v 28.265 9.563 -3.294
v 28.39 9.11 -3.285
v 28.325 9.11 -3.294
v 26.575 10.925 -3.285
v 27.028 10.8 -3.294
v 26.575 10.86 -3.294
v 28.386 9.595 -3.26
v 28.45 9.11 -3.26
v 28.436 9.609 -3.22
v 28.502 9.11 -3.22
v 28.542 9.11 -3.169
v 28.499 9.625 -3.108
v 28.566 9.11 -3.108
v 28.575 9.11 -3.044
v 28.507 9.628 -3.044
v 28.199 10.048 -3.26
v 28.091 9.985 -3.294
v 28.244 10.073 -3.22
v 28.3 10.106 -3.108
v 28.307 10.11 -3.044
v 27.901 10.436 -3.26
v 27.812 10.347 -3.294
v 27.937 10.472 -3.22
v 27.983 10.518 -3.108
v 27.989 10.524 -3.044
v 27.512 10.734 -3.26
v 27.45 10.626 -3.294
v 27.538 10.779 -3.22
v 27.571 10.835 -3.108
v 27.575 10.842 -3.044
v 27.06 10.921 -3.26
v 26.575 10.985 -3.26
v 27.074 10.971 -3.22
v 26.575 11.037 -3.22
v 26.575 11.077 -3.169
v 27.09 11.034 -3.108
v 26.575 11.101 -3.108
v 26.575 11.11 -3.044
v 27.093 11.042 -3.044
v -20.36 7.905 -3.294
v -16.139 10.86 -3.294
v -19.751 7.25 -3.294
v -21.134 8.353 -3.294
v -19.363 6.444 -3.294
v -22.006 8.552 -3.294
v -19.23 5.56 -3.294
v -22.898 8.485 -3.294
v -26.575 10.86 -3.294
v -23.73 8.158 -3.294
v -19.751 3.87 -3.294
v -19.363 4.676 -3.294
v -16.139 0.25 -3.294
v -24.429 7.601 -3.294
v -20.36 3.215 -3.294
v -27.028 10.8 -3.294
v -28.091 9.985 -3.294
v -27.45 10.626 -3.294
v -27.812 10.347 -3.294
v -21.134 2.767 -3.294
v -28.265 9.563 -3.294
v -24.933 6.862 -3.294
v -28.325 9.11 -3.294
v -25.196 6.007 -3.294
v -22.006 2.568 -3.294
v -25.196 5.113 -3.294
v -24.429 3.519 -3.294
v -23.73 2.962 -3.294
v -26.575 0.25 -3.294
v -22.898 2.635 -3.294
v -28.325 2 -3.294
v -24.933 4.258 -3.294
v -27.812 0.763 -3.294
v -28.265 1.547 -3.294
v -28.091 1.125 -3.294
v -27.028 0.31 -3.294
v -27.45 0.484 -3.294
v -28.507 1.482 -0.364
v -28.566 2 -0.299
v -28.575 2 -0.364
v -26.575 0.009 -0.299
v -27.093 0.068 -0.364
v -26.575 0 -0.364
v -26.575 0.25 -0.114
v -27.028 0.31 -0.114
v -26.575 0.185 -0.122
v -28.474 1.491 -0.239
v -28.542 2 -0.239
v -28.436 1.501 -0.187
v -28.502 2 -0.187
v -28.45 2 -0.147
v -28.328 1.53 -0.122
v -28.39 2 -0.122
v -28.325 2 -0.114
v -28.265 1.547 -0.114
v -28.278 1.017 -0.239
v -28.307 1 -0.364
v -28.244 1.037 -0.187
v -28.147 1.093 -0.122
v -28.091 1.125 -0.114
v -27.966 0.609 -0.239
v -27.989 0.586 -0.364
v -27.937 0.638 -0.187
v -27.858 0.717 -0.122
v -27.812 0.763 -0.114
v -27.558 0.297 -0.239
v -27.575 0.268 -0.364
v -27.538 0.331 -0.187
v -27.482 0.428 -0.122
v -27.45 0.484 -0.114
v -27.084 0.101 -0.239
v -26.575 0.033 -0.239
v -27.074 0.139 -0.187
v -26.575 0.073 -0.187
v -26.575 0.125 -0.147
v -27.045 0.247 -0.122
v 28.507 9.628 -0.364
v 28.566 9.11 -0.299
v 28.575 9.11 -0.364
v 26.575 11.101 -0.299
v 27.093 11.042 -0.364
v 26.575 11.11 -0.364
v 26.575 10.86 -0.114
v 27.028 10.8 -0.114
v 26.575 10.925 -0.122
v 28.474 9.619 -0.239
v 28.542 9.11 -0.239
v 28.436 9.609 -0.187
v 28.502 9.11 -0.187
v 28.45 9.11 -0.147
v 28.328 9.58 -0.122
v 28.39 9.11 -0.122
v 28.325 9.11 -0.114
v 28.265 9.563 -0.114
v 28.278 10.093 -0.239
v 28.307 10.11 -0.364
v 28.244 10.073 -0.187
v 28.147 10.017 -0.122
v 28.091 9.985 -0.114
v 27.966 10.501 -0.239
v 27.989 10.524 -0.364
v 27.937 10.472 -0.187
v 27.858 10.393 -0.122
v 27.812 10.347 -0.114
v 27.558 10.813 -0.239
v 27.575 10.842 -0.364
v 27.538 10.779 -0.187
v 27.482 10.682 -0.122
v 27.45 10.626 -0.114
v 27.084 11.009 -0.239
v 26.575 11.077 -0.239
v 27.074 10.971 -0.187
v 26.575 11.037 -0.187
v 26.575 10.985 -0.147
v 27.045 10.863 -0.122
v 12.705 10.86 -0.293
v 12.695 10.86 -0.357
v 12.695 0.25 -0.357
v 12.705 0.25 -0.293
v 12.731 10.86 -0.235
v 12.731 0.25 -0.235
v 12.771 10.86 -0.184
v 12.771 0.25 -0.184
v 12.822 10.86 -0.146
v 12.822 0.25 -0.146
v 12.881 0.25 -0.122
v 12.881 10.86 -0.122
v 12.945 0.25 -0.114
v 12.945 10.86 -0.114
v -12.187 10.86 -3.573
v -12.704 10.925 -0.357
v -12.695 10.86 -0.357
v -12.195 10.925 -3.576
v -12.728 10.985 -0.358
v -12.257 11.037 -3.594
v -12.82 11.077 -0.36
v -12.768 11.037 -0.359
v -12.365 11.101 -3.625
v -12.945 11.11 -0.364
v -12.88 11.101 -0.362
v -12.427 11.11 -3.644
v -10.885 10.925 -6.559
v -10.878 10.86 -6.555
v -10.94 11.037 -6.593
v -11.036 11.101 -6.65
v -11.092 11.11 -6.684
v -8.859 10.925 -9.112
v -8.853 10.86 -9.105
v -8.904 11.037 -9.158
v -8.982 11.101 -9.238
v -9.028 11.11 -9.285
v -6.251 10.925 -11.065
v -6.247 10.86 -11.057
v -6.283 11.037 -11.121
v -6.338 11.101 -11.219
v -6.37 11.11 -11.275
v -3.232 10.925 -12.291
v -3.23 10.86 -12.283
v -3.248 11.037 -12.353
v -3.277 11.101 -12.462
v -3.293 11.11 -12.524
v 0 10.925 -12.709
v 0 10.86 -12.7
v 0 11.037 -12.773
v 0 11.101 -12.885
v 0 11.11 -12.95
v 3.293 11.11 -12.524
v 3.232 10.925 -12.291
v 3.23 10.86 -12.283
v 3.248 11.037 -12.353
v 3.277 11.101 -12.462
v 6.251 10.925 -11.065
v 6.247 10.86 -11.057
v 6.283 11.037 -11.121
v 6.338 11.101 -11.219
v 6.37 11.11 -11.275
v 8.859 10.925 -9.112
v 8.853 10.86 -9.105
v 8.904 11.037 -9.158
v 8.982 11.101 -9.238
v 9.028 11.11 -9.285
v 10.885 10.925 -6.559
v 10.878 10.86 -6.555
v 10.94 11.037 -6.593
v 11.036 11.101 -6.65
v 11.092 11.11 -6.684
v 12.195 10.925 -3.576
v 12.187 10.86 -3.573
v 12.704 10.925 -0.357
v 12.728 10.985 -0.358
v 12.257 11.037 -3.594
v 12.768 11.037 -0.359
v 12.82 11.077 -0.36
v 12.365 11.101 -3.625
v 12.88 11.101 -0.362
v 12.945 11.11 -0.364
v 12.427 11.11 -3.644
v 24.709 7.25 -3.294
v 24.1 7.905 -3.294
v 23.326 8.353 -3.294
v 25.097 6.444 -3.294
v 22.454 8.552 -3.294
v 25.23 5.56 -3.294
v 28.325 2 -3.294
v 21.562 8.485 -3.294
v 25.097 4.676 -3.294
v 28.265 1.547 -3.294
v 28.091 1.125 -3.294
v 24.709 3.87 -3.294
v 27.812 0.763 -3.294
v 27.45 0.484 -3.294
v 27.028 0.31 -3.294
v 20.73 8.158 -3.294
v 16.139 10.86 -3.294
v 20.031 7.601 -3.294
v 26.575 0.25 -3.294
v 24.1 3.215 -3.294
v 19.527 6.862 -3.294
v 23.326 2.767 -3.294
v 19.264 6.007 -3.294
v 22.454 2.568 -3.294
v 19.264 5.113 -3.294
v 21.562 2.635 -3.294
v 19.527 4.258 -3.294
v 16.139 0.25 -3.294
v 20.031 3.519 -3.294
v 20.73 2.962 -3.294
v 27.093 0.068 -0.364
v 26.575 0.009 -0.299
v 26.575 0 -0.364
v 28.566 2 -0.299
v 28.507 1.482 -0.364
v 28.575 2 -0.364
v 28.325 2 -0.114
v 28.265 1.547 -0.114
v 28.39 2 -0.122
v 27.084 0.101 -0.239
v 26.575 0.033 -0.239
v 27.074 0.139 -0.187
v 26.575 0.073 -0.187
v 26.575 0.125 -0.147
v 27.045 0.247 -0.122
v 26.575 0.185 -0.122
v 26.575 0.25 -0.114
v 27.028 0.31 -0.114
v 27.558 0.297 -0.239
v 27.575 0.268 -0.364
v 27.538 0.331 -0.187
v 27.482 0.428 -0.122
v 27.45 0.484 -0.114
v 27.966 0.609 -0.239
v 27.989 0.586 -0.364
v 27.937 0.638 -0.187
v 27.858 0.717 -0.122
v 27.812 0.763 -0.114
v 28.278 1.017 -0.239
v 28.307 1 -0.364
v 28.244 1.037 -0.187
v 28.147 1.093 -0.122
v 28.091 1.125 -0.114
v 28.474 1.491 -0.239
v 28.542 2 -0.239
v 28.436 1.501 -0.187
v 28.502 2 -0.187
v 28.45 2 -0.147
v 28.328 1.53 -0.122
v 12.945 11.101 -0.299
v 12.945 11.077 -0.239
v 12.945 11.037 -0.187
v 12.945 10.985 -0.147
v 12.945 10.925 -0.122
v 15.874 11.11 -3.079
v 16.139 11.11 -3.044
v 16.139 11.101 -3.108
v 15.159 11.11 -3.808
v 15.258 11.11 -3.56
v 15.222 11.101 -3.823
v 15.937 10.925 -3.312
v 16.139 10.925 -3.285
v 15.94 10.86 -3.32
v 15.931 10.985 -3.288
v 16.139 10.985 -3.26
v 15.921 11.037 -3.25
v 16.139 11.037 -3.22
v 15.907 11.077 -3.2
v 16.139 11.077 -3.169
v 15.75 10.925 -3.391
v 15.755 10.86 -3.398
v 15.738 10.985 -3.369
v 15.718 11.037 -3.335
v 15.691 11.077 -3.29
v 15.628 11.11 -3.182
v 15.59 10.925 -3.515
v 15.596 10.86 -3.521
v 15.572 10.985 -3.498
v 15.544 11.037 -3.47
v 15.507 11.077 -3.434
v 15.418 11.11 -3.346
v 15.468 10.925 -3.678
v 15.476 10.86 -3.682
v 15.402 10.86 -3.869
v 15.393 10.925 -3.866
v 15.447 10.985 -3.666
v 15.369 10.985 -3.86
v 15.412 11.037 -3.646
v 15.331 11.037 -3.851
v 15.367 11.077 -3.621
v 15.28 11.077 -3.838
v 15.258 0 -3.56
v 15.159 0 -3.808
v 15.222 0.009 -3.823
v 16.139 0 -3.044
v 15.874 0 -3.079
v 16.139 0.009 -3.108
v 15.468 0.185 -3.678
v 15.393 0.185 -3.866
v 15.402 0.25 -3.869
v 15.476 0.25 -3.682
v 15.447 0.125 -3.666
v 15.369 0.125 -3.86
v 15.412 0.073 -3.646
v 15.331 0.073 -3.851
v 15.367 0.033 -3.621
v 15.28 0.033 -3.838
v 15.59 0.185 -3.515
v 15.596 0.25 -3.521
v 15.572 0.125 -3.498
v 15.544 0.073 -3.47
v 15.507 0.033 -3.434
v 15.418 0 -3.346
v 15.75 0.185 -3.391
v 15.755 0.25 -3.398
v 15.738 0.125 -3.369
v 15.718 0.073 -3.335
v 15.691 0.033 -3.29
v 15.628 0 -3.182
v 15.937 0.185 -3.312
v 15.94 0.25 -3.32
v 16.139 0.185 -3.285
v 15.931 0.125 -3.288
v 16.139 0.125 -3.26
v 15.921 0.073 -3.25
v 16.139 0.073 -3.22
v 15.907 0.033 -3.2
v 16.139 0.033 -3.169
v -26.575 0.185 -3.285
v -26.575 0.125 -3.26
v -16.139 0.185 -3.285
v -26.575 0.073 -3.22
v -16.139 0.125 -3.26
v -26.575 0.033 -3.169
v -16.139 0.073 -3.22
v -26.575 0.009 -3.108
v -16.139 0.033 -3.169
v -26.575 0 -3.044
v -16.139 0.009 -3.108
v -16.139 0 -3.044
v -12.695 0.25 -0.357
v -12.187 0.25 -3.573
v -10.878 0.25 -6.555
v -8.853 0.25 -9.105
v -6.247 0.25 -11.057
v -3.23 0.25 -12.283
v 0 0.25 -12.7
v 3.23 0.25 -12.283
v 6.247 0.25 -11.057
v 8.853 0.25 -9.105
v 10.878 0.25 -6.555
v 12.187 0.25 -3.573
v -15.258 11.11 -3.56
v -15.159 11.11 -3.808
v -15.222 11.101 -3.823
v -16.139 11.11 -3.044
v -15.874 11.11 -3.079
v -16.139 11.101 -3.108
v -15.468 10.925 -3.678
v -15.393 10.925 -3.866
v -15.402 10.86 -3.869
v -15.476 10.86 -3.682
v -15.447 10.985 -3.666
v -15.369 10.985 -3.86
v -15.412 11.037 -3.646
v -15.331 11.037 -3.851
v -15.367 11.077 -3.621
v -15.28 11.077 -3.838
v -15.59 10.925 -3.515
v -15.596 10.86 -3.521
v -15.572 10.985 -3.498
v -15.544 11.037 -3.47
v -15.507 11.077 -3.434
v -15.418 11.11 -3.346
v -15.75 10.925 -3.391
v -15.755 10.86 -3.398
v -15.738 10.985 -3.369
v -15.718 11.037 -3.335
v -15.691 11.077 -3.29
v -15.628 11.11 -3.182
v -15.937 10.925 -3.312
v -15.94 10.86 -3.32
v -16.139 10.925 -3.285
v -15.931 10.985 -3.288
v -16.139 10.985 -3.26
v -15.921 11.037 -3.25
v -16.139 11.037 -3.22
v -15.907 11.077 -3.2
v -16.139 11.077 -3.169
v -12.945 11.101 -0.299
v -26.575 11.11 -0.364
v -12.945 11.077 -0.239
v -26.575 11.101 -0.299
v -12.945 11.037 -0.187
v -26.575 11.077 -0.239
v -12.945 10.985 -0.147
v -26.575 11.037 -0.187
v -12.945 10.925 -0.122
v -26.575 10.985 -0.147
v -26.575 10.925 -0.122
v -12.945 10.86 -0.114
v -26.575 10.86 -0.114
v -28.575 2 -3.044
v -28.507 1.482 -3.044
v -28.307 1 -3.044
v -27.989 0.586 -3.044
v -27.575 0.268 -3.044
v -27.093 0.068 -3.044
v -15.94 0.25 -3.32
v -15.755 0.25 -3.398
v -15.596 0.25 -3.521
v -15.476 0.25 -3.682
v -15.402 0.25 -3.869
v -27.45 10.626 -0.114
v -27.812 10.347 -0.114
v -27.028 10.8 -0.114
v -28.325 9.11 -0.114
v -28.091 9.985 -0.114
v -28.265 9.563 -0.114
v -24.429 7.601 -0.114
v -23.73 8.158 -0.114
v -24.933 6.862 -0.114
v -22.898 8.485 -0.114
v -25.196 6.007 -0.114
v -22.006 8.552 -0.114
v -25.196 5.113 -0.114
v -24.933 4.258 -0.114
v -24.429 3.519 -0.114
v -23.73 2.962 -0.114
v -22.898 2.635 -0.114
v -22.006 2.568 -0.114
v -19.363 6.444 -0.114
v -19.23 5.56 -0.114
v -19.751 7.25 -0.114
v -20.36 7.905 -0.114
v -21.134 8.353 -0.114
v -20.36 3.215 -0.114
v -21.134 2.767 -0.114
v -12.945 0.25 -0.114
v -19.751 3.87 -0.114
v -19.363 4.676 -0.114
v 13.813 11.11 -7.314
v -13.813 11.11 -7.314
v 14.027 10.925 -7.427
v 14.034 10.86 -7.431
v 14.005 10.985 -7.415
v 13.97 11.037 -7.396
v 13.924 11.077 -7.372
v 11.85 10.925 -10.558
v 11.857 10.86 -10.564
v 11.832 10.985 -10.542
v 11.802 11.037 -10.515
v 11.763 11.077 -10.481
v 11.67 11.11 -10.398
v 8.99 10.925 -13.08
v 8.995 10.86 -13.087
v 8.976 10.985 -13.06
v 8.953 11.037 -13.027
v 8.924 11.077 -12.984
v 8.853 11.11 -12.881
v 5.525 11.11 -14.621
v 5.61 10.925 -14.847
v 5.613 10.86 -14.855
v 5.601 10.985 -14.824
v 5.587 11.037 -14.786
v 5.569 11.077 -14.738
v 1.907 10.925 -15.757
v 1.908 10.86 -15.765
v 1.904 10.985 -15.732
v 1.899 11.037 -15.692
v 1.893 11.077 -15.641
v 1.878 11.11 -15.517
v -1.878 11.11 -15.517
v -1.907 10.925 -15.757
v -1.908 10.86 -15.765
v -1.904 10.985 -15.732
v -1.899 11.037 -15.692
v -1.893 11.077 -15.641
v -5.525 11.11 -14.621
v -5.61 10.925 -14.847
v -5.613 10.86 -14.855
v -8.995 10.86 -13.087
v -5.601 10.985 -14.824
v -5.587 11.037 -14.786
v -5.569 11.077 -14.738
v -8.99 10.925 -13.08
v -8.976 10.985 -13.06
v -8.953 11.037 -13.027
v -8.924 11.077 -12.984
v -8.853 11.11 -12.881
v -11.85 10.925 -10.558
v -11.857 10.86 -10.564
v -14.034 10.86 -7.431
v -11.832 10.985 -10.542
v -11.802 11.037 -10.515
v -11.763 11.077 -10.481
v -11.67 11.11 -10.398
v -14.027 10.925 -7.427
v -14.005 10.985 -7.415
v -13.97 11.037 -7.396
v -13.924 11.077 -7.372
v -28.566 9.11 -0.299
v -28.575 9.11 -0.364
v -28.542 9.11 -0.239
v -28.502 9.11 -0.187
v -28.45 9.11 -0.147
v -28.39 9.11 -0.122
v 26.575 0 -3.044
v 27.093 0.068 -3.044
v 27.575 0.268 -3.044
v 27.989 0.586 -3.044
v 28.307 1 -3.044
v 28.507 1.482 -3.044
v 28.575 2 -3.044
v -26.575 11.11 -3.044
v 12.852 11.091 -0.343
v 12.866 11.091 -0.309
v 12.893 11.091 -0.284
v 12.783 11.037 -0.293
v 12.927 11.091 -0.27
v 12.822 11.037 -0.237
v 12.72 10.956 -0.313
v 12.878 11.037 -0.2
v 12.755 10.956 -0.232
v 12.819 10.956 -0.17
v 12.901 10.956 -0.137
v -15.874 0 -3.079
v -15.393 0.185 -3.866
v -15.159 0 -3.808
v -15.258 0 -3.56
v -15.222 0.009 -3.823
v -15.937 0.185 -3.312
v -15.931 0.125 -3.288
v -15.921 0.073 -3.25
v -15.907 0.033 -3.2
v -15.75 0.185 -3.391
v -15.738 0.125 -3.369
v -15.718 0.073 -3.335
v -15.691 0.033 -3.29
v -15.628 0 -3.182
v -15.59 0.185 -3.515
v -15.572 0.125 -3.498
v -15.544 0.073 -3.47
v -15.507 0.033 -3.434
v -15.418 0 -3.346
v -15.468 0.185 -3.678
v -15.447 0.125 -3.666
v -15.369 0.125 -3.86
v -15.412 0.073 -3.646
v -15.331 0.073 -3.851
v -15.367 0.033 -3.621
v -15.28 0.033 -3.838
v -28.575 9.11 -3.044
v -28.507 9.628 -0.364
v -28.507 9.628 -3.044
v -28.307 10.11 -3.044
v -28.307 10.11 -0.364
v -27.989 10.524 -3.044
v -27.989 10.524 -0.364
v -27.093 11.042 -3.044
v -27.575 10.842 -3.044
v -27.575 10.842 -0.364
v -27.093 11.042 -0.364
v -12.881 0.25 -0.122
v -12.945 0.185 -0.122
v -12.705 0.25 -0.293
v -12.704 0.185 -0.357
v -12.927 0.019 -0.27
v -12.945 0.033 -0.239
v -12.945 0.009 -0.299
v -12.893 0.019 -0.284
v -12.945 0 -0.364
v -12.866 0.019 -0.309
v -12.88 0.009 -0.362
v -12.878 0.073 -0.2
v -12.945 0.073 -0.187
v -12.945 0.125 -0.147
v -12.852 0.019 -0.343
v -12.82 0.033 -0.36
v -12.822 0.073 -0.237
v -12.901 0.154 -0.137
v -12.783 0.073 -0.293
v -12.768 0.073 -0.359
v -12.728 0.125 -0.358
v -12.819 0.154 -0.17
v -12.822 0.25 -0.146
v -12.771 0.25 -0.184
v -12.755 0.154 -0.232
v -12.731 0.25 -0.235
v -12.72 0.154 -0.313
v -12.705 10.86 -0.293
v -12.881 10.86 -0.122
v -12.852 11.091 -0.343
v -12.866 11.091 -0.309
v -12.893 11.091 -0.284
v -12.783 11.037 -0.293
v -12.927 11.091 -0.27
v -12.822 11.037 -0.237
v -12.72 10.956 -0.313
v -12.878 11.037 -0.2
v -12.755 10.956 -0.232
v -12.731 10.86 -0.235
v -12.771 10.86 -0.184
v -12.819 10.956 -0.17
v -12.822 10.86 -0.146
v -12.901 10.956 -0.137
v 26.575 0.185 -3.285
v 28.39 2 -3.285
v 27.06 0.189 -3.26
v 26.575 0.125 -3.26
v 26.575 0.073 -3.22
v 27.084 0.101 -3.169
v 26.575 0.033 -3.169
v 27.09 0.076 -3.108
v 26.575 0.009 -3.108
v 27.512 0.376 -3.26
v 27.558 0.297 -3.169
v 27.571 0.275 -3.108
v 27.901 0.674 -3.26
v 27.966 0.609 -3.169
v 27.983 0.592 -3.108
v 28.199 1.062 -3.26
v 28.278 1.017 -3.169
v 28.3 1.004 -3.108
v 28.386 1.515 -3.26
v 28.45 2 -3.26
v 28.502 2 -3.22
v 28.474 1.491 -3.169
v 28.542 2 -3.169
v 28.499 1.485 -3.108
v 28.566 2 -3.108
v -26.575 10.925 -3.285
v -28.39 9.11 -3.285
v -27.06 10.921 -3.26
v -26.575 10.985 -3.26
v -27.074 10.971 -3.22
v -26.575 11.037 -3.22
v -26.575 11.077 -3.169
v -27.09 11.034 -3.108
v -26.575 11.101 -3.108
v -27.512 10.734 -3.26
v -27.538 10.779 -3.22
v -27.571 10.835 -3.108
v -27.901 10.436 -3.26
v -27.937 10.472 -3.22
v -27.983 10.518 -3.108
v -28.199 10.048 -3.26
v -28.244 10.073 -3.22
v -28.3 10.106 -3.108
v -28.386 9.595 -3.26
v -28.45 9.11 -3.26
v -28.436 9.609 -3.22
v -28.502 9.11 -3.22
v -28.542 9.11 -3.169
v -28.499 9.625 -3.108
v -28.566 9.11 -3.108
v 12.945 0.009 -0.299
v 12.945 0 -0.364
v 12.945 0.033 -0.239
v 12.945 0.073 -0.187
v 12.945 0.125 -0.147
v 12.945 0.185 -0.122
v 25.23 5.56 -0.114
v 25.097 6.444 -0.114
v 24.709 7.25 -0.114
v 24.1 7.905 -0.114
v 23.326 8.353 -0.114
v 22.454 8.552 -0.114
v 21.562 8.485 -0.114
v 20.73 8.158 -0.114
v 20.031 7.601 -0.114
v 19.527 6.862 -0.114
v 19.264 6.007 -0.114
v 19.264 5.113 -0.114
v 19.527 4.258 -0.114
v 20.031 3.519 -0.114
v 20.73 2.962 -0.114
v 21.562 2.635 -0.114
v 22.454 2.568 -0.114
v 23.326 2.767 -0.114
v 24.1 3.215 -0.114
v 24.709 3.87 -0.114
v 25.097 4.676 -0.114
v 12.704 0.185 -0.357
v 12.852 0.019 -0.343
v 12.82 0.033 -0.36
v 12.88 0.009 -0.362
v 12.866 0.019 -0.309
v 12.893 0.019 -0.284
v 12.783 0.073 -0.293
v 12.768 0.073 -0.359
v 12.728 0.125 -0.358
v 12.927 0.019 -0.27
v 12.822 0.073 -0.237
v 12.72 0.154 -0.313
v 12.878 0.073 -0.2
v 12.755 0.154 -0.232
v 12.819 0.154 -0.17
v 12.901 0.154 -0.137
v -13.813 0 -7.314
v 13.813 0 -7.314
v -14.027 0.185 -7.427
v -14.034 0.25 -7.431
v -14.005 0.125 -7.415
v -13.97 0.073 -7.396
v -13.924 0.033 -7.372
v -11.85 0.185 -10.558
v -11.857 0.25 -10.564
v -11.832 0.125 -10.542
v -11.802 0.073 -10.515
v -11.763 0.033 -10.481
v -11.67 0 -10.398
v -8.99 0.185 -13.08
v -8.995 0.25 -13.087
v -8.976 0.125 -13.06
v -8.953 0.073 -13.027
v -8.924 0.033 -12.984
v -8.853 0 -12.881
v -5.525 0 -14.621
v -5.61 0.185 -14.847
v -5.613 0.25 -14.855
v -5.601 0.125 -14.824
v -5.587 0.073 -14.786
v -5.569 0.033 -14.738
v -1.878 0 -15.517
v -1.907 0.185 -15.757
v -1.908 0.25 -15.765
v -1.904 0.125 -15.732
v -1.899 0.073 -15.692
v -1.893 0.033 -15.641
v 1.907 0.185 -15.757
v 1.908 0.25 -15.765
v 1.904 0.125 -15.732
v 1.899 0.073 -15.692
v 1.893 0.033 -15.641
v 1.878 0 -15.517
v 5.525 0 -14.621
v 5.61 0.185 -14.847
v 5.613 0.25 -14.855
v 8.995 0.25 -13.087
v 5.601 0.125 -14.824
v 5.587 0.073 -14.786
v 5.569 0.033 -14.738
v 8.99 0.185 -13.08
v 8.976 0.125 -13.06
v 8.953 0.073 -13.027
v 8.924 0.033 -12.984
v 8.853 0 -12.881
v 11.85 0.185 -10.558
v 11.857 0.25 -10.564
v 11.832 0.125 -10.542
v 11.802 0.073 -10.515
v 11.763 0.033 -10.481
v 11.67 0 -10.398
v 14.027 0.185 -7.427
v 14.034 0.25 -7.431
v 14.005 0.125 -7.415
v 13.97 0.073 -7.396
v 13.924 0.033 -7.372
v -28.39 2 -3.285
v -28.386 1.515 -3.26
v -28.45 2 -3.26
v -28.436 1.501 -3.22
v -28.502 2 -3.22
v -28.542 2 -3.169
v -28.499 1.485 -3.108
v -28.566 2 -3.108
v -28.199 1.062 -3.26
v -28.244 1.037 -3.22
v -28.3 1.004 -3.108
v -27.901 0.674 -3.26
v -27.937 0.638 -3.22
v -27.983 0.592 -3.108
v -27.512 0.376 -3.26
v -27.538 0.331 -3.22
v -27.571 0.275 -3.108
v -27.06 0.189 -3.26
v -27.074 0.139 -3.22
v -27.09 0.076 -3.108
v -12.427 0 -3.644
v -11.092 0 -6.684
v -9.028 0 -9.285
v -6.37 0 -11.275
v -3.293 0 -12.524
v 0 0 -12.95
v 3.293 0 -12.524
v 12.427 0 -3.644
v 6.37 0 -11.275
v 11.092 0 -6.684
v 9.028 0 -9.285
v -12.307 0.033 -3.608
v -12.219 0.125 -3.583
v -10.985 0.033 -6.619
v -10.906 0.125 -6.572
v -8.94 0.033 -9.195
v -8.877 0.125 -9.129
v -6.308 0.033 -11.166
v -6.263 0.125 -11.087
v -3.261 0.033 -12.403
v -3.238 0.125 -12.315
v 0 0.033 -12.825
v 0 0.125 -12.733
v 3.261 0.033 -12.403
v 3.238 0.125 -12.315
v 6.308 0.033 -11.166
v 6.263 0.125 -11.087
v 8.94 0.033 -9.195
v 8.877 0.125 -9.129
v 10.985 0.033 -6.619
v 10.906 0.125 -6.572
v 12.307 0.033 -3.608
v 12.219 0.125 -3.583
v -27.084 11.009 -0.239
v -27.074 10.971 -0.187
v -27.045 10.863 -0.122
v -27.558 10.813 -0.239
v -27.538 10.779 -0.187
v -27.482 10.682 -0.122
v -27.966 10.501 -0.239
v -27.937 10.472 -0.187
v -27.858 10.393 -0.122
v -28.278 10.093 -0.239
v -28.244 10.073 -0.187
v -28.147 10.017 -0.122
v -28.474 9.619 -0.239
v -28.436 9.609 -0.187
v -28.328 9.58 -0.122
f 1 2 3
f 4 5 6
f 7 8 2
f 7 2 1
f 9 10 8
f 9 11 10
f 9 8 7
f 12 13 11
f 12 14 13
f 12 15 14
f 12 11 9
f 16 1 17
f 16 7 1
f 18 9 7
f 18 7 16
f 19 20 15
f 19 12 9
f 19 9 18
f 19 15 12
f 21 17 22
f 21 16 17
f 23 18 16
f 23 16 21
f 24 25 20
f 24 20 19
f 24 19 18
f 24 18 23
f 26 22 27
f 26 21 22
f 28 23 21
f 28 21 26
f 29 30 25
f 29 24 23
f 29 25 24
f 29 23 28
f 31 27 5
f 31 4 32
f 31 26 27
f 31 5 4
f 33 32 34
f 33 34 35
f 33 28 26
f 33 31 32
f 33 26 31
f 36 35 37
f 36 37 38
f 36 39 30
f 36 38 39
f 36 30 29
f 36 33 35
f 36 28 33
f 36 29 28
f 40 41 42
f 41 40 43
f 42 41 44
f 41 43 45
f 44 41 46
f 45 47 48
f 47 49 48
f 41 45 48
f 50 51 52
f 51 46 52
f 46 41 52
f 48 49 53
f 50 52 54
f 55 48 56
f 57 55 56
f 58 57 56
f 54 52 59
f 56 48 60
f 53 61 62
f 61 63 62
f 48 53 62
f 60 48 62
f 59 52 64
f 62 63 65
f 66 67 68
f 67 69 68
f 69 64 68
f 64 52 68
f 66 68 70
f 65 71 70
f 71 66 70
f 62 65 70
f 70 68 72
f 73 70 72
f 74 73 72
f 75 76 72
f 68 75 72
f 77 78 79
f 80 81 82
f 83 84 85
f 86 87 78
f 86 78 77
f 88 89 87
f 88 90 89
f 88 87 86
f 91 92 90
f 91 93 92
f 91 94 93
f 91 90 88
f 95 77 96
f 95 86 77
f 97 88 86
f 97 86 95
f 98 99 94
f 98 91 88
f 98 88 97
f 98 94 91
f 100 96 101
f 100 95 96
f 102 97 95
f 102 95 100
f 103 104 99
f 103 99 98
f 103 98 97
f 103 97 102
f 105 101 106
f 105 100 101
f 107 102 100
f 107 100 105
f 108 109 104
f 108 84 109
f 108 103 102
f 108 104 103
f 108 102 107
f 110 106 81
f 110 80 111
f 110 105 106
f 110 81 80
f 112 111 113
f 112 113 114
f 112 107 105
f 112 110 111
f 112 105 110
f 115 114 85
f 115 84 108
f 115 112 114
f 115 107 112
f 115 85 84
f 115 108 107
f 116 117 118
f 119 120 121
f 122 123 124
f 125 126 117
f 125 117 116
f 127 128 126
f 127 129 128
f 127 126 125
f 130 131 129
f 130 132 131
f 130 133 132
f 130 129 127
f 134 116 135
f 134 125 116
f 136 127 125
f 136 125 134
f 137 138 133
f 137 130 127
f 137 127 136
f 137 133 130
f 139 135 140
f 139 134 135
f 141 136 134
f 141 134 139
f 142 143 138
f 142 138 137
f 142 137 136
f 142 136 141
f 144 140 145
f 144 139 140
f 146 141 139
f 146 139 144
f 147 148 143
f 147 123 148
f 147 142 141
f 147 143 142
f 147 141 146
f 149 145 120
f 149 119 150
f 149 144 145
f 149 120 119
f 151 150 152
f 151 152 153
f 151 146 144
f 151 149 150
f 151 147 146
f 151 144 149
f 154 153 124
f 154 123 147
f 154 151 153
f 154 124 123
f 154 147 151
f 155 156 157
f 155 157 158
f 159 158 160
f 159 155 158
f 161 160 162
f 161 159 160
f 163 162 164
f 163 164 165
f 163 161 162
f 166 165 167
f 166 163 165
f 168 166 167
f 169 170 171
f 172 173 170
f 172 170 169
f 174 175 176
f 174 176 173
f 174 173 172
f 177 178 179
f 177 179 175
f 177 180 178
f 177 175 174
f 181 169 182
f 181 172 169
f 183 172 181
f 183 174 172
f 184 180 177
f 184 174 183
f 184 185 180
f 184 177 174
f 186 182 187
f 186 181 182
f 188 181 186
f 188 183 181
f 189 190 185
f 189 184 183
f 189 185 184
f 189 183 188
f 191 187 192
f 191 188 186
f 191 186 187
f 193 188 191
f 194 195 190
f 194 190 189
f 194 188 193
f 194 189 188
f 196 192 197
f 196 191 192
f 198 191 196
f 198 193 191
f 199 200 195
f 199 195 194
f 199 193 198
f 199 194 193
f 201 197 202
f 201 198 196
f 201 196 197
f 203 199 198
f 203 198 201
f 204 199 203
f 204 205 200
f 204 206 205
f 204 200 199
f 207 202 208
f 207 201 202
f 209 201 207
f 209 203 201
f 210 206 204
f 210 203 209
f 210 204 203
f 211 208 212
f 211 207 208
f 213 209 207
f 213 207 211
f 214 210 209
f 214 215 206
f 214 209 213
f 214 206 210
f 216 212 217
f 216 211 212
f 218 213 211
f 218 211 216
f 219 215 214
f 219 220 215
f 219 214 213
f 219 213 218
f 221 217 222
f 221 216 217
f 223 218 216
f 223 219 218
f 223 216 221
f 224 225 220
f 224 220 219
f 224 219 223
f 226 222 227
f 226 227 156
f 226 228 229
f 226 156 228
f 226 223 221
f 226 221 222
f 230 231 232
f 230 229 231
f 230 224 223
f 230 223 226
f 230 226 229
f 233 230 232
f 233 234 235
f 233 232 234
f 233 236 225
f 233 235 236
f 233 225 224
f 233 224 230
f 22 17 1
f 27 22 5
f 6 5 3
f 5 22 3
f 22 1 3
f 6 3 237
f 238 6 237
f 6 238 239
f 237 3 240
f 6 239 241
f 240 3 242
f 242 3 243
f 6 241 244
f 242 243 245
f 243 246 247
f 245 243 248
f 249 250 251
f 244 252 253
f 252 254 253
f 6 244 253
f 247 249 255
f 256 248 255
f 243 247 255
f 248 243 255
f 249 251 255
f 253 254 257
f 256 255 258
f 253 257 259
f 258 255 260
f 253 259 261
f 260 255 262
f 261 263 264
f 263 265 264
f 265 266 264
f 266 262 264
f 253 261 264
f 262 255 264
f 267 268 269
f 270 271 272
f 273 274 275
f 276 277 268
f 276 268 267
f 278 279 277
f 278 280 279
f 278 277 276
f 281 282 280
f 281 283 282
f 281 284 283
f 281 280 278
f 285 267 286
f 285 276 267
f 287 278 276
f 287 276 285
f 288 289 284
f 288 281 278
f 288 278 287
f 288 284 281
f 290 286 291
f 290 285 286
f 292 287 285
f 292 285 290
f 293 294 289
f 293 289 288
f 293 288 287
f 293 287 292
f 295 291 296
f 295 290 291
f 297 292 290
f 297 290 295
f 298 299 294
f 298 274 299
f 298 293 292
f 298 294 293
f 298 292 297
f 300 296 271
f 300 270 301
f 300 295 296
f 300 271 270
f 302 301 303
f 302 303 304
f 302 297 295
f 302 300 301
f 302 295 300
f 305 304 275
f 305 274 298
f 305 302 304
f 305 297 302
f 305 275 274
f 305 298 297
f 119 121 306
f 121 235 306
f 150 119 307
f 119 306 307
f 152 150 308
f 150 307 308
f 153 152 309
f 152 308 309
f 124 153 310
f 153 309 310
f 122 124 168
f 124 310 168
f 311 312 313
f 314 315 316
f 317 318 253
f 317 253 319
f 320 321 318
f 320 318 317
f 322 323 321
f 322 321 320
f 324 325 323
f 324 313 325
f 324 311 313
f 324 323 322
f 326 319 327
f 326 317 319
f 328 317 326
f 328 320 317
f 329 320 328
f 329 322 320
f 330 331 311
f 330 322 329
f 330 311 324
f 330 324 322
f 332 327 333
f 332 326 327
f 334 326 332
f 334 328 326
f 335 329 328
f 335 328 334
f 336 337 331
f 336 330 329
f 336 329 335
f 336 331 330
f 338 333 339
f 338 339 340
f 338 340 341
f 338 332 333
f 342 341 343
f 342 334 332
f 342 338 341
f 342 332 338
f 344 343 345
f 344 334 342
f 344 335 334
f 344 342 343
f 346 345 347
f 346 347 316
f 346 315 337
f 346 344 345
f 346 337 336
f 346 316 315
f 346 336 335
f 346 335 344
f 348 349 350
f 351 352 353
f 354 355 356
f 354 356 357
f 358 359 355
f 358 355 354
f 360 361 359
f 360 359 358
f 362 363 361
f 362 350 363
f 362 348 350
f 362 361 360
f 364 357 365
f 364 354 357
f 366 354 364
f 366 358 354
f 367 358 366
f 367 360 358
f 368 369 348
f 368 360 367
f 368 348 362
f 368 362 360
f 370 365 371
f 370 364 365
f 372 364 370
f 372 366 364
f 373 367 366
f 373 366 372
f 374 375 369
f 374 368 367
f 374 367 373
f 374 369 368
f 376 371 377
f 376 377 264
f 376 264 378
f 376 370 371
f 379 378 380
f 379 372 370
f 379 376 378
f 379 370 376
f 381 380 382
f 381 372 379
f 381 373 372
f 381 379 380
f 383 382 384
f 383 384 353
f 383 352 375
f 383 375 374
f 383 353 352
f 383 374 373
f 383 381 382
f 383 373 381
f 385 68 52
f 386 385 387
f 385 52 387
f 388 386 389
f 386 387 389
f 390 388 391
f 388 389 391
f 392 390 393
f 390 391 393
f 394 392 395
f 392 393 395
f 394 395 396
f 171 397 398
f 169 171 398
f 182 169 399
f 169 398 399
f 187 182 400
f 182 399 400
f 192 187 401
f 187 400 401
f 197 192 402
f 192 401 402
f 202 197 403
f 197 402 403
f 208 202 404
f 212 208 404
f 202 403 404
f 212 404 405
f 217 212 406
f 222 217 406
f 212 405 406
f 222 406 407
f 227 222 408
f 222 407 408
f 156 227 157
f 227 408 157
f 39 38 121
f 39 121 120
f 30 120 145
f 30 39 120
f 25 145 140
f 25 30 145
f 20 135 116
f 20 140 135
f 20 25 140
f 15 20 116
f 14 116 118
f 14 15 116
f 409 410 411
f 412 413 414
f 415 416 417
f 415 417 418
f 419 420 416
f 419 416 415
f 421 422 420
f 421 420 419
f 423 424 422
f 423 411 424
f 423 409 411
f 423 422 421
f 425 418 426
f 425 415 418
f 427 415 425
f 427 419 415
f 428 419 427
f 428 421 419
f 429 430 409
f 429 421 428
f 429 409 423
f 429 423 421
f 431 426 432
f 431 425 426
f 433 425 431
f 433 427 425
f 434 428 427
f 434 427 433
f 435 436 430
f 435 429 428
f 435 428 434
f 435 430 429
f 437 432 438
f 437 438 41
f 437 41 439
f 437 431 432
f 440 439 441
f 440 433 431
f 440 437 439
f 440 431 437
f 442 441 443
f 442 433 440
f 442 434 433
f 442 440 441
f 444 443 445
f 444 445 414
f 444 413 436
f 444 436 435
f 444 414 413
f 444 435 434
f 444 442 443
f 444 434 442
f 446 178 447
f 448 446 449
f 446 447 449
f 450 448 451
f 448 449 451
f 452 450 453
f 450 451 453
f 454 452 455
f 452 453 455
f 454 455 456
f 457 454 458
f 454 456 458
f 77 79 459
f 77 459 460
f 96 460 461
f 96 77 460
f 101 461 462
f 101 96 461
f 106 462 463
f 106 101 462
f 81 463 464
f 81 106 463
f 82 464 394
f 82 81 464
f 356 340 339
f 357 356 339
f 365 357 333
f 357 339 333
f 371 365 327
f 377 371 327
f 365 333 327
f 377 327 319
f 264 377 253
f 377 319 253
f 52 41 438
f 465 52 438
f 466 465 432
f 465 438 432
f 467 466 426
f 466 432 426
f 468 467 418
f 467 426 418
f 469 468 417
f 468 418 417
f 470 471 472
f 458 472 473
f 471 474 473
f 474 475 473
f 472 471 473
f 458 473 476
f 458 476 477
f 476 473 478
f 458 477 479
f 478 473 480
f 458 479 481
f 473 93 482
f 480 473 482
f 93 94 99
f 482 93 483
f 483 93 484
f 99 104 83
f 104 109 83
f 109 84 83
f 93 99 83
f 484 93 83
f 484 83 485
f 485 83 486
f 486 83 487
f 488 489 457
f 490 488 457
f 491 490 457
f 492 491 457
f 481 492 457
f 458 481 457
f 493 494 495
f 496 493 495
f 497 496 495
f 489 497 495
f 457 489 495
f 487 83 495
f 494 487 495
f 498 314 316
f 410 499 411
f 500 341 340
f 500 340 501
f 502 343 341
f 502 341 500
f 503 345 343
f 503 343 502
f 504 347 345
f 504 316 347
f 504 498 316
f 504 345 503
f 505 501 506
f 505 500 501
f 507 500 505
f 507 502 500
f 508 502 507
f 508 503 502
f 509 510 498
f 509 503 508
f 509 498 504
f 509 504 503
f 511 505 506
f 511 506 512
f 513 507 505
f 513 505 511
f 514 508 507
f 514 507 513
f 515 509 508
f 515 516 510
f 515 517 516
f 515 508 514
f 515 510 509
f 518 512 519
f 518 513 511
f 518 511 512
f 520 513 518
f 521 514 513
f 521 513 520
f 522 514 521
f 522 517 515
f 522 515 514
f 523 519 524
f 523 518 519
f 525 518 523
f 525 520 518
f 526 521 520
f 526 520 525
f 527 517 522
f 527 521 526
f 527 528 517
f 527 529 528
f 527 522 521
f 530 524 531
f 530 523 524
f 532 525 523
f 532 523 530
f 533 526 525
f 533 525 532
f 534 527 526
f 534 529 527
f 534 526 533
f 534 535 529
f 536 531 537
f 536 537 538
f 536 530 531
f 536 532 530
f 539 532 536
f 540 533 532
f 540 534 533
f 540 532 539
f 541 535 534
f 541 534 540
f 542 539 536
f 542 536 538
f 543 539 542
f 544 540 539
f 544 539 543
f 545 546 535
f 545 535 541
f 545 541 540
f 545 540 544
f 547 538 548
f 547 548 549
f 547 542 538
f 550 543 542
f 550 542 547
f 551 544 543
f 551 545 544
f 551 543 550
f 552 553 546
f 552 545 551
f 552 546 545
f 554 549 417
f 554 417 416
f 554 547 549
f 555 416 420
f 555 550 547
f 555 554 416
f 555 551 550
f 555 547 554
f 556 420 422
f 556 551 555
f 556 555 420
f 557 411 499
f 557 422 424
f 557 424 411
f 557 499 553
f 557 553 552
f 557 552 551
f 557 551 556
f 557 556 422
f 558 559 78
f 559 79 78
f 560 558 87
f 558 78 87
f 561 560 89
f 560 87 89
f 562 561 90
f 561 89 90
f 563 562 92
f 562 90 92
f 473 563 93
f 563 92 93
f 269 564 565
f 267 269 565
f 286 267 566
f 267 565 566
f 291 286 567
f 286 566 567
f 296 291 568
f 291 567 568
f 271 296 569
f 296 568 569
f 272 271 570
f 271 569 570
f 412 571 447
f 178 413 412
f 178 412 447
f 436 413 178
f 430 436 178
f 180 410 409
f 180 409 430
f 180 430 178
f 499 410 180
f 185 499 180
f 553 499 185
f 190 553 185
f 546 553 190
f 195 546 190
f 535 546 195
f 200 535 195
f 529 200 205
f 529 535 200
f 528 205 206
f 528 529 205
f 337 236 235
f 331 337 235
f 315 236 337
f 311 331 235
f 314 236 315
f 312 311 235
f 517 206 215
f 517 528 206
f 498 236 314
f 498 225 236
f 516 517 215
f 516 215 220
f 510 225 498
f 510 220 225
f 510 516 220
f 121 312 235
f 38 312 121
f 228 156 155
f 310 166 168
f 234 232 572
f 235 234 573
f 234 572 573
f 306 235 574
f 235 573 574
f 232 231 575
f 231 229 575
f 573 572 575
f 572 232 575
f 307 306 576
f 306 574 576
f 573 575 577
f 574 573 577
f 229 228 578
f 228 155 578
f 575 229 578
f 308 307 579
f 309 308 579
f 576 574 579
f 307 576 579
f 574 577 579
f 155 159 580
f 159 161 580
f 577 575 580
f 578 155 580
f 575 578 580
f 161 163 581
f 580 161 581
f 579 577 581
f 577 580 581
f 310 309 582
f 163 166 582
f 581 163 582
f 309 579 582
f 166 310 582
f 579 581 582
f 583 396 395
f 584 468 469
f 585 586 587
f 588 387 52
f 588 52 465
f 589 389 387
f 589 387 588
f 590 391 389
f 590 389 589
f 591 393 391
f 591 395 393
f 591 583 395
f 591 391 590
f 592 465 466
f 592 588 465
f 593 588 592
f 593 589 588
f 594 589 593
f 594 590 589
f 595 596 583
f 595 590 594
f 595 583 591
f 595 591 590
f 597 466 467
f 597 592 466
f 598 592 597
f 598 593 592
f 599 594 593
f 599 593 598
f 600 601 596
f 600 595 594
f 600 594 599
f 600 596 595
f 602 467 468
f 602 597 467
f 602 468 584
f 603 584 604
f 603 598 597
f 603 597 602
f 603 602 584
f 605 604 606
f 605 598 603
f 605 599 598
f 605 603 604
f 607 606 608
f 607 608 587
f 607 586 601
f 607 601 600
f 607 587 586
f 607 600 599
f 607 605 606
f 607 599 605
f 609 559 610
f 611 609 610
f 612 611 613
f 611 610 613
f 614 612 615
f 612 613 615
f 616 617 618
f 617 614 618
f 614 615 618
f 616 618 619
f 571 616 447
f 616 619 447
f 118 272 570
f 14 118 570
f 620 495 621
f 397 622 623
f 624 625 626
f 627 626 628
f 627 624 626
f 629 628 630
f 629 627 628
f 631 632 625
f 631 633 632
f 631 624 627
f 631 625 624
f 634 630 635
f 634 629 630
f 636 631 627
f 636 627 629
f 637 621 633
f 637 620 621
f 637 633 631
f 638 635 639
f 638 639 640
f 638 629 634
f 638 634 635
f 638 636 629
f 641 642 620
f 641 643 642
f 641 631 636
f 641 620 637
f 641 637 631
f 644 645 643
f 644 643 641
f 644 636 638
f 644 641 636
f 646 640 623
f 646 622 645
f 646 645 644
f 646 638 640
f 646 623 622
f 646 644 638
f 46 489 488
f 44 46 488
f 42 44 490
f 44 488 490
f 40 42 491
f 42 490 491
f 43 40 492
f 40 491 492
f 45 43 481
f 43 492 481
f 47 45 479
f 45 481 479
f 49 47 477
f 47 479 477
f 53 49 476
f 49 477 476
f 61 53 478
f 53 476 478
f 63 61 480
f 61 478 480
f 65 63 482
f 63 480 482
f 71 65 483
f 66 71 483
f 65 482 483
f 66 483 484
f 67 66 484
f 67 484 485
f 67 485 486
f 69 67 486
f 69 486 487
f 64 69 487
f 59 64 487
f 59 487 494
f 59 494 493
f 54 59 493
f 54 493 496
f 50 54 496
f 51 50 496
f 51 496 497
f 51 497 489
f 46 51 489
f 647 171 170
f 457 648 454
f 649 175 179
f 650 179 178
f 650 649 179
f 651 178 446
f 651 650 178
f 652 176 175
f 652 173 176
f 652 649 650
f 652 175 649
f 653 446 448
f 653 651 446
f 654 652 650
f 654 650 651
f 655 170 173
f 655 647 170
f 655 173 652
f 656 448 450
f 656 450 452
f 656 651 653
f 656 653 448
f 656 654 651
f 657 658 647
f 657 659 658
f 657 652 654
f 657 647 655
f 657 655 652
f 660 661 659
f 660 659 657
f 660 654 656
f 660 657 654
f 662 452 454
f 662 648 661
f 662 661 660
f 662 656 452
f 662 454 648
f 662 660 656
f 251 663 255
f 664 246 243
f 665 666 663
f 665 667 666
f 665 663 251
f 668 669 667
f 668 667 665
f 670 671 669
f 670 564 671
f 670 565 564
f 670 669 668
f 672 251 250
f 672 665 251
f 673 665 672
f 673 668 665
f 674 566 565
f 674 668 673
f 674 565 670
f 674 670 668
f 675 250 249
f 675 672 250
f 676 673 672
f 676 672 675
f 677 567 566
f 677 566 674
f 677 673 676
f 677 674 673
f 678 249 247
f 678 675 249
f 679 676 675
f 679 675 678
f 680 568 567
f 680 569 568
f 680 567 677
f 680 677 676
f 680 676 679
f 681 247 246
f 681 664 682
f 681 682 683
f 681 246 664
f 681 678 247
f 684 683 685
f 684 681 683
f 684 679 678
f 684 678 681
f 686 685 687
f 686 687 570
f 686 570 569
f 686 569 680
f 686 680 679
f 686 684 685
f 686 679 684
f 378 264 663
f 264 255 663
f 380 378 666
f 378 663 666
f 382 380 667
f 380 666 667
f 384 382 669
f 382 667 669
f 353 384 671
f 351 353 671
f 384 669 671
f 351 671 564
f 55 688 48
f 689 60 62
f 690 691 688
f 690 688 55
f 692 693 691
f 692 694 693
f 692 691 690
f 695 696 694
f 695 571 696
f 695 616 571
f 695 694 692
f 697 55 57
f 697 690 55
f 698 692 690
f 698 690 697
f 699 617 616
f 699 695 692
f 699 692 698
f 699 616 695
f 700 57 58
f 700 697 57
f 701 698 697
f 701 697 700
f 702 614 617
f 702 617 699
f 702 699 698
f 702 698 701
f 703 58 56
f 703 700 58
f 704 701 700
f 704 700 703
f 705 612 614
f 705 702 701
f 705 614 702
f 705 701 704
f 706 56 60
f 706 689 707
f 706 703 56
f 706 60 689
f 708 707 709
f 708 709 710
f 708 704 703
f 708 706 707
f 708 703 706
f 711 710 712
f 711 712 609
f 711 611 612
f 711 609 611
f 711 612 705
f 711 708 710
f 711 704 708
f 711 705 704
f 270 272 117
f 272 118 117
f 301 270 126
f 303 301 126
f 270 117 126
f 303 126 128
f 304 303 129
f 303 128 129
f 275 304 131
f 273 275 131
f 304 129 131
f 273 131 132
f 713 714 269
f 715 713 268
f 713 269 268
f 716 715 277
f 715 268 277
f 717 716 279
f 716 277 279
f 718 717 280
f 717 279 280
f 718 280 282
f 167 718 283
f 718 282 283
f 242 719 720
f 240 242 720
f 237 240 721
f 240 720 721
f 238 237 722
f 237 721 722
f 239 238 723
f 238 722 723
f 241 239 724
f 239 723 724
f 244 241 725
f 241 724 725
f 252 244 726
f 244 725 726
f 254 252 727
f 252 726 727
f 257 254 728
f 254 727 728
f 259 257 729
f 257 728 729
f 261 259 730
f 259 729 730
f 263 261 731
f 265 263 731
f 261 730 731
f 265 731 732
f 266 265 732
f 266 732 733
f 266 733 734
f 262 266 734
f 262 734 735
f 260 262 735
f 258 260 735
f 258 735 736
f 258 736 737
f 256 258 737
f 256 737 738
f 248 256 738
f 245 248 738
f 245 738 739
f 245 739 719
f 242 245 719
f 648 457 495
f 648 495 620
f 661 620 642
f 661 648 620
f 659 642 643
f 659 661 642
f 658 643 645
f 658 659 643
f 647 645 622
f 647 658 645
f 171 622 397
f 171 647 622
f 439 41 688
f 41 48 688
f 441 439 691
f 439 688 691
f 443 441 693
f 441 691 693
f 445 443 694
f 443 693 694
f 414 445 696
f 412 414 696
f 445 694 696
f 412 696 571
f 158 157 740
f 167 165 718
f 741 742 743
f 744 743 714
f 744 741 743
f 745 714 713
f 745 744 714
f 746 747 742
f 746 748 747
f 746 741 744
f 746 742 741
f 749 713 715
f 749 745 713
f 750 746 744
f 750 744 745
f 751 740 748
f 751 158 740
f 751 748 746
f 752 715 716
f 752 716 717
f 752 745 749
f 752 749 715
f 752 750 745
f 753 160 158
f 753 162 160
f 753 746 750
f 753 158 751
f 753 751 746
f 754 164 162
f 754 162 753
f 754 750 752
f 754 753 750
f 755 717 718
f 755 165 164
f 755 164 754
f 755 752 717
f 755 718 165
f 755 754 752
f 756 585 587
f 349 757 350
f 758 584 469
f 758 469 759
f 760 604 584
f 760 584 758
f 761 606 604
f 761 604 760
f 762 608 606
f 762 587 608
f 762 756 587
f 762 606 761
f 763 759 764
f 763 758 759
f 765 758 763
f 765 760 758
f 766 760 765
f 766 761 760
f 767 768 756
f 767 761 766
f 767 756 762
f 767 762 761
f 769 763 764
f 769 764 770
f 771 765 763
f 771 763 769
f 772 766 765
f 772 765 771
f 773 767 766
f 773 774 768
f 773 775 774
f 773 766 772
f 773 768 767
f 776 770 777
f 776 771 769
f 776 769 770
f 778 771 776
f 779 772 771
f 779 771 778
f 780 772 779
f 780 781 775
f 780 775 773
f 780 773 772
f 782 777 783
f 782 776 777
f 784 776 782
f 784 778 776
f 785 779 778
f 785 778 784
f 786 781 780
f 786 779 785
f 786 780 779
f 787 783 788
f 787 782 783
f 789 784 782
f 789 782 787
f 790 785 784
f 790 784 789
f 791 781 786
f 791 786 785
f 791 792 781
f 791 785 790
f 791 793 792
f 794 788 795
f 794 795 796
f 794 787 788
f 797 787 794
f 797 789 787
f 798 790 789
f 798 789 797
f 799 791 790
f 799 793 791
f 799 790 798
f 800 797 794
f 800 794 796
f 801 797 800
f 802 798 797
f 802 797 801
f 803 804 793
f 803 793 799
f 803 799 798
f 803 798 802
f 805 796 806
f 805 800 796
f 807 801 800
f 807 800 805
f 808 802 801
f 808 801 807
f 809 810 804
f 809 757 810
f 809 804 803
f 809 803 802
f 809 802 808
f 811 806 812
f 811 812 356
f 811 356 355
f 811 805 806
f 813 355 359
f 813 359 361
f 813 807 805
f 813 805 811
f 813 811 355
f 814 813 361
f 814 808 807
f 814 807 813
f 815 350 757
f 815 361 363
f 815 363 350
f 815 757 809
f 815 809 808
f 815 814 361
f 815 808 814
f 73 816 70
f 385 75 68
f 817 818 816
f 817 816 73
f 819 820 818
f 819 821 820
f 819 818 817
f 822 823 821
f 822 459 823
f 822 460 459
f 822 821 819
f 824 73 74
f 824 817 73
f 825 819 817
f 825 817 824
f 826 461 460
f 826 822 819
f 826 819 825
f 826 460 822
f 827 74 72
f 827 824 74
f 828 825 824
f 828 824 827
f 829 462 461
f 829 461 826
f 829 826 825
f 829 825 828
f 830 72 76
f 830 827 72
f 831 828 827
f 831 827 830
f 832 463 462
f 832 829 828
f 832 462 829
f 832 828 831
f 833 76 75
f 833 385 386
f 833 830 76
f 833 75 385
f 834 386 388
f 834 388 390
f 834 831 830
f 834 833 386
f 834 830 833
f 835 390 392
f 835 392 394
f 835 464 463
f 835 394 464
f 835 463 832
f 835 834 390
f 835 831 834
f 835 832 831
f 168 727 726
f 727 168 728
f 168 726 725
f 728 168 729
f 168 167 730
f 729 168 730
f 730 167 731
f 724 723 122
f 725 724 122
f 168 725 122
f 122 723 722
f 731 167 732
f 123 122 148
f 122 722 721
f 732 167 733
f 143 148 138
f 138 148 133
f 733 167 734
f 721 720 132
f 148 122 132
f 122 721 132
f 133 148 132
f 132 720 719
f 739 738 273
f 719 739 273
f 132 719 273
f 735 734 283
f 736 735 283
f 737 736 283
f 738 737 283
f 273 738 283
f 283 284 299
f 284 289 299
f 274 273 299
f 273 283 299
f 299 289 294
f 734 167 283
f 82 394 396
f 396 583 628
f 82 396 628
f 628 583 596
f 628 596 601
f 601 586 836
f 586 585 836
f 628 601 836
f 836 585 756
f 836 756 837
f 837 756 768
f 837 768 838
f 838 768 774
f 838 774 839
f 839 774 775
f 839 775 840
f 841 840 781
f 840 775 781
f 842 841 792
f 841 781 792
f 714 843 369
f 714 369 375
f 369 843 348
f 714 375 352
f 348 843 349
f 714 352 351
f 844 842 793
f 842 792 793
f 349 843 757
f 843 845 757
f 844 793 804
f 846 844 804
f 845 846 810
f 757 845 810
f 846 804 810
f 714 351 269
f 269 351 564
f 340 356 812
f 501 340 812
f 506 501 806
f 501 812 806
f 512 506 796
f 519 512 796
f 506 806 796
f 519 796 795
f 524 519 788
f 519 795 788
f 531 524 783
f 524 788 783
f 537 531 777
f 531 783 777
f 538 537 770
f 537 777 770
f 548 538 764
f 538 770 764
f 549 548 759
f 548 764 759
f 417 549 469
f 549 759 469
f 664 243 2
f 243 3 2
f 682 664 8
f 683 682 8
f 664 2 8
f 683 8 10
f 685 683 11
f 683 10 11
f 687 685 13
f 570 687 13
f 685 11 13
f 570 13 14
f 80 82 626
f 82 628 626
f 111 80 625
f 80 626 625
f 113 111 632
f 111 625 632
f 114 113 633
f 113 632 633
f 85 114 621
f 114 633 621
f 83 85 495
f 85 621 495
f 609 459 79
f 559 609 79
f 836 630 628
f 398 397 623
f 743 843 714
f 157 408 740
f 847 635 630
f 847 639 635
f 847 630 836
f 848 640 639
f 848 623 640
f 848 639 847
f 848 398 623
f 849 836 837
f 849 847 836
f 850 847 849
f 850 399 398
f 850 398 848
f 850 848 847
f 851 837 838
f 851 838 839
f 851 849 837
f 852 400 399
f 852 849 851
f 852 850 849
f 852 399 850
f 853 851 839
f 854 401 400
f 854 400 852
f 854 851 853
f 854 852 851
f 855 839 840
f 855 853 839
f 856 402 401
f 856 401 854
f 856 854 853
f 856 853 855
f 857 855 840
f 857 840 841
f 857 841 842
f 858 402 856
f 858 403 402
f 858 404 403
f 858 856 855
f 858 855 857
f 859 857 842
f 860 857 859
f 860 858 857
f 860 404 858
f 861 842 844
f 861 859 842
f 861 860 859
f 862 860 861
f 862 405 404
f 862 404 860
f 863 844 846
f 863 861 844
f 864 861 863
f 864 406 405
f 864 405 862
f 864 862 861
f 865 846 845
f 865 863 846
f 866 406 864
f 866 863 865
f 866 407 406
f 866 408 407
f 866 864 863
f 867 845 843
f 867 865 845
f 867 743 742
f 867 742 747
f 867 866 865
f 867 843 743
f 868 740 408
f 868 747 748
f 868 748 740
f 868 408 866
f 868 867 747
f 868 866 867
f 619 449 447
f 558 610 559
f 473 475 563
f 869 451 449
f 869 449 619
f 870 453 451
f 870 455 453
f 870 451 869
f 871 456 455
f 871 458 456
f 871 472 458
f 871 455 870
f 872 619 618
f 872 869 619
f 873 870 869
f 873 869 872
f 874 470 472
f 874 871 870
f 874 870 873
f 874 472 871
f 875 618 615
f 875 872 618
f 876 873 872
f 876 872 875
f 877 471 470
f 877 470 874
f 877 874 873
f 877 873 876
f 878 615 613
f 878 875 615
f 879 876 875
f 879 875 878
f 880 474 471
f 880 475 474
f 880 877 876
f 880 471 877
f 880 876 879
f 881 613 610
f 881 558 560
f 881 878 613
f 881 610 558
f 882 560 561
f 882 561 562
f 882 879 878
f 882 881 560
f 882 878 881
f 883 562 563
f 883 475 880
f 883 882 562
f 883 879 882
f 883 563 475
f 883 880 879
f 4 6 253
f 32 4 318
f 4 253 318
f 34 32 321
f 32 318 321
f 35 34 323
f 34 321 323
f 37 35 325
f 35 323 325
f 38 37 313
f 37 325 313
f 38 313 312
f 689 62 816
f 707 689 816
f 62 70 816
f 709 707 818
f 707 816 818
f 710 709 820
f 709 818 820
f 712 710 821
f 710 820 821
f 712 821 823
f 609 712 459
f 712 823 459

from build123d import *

# Parameters (mm, degrees)
DODANIE_WYCI_GNI_CIE1_DEPTH    = 11.11
OTWORY_USTALAJ_CE_6_0MM1_D     = 6
OTWORY_USTALAJ_CE_6_0MM1_DEPTH = 3.18
ZAOKR_GLENIE1_R                = 2
ZAOKR_GLENIE2_R                = 0.76
ZAOKR_GLENIE4_R                = 0.25


with BuildPart() as part:
    # Szkic1 → Dodanie-wyciągnięcie1 (new body)
    with BuildSketch(Plane(origin=(0, 0, 0), x_dir=(1, 0, 0), z_dir=(0, 1, 0))):
        with BuildLine():
            Line((-28.575, 0.113686746), (-12.699491144, 0.113686746))
            ThreePointArc((-12.699491144, 0.113686746), (0, 12.7), (12.699491144, 0.113686746))
            Line((12.699491144, 0.113686746), (28.575, 0.113686746))
            Line((28.575, 0.113686746), (28.575, 3.293686746))
            Line((28.575, 3.293686746), (15.53467179, 3.293686746))
            ThreePointArc((15.53467179, 3.293686746), (0, 15.88), (-15.53467179, 3.293686746))
            Line((-15.53467179, 3.293686746), (-28.575, 3.293686746))
            Line((-28.575, 3.293686746), (-28.575, 0.113686746))
        make_face()
    extrude(amount=DODANIE_WYCI_GNI_CIE1_DEPTH)

    # Otwory ustalające Ø6.0mm1
    with Locations(Plane(origin=(0, 0, -3.293686746), x_dir=(-1, 0, 0), z_dir=(0, 0, -1))):
        with Locations((-22.23, 5.56), (22.23, 5.56)):
            Hole(OTWORY_USTALAJ_CE_6_0MM1_D / 2, depth=OTWORY_USTALAJ_CE_6_0MM1_DEPTH)

    # Zaokrąglenie1
    zaokr_glenie1_edges = [part.edges().sort_by_distance(p)[0] for p in [
        (28.575, 0, -1.703686746),
        (-28.575, 11.11, -1.703686746),
        (28.575, 11.11, -1.703686746),
        (-28.575, 0, -1.703686746),
    ]]
    fillet(zaokr_glenie1_edges, radius=ZAOKR_GLENIE1_R)

    # Zaokrąglenie2
    zaokr_glenie2_edges = [part.edges().sort_by_distance(p)[0] for p in [
        (-15.53467179, 5.555, -3.293686746),
        (15.53467179, 5.555, -3.293686746),
    ]]
    fillet(zaokr_glenie2_edges, radius=ZAOKR_GLENIE2_R)

    # Zaokrąglenie4
    zaokr_glenie4_edges = [part.edges().sort_by_distance(p)[0] for p in [
        (19.637245572, 0, -0.113686746),
        (12.699491144, 5.555, -0.113686746),
        (-12.699491144, 5.555, -0.113686746),
        (0, 11.11, -12.7),
        (28.575, 5.555, -3.293686746),
        (28.575, 5.555, -0.113686746),
        (27.989213562, 10.524213562, -3.293686746),
        (27.989213562, 0.585786438, -3.293686746),
        (-19.637245572, 0, -0.113686746),
        (-21.356843588, 0, -3.293686746),
        (27.989213562, 10.524213562, -0.113686746),
        (27.989213562, 0.585786438, -0.113686746),
        (-21.356843588, 11.11, -3.293686746),
        (-19.637245572, 11.11, -0.113686746),
        (-28.575, 5.555, -0.113686746),
        (-28.575, 5.555, -3.293686746),
        (-27.989213562, 0.585786438, -3.293686746),
        (-27.989213562, 10.524213562, -3.293686746),
        (-27.989213562, 0.585786438, -0.113686746),
        (-27.989213562, 10.524213562, -0.113686746),
        (19.637245572, 11.11, -0.113686746),
        (0, 0, -15.88),
        (0, 11.11, -15.88),
        (21.356843588, 0, -3.293686746),
        (21.356843588, 11.11, -3.293686746),
        (-15.671306016, 0, -3.45439145),
        (-15.671306016, 11.11, -3.45439145),
        (15.671306016, 0, -3.45439145),
        (15.671306016, 11.11, -3.45439145),
        (0, 0, -12.7),
    ]]
    fillet(zaokr_glenie4_edges, radius=ZAOKR_GLENIE4_R)


solid = part.part
